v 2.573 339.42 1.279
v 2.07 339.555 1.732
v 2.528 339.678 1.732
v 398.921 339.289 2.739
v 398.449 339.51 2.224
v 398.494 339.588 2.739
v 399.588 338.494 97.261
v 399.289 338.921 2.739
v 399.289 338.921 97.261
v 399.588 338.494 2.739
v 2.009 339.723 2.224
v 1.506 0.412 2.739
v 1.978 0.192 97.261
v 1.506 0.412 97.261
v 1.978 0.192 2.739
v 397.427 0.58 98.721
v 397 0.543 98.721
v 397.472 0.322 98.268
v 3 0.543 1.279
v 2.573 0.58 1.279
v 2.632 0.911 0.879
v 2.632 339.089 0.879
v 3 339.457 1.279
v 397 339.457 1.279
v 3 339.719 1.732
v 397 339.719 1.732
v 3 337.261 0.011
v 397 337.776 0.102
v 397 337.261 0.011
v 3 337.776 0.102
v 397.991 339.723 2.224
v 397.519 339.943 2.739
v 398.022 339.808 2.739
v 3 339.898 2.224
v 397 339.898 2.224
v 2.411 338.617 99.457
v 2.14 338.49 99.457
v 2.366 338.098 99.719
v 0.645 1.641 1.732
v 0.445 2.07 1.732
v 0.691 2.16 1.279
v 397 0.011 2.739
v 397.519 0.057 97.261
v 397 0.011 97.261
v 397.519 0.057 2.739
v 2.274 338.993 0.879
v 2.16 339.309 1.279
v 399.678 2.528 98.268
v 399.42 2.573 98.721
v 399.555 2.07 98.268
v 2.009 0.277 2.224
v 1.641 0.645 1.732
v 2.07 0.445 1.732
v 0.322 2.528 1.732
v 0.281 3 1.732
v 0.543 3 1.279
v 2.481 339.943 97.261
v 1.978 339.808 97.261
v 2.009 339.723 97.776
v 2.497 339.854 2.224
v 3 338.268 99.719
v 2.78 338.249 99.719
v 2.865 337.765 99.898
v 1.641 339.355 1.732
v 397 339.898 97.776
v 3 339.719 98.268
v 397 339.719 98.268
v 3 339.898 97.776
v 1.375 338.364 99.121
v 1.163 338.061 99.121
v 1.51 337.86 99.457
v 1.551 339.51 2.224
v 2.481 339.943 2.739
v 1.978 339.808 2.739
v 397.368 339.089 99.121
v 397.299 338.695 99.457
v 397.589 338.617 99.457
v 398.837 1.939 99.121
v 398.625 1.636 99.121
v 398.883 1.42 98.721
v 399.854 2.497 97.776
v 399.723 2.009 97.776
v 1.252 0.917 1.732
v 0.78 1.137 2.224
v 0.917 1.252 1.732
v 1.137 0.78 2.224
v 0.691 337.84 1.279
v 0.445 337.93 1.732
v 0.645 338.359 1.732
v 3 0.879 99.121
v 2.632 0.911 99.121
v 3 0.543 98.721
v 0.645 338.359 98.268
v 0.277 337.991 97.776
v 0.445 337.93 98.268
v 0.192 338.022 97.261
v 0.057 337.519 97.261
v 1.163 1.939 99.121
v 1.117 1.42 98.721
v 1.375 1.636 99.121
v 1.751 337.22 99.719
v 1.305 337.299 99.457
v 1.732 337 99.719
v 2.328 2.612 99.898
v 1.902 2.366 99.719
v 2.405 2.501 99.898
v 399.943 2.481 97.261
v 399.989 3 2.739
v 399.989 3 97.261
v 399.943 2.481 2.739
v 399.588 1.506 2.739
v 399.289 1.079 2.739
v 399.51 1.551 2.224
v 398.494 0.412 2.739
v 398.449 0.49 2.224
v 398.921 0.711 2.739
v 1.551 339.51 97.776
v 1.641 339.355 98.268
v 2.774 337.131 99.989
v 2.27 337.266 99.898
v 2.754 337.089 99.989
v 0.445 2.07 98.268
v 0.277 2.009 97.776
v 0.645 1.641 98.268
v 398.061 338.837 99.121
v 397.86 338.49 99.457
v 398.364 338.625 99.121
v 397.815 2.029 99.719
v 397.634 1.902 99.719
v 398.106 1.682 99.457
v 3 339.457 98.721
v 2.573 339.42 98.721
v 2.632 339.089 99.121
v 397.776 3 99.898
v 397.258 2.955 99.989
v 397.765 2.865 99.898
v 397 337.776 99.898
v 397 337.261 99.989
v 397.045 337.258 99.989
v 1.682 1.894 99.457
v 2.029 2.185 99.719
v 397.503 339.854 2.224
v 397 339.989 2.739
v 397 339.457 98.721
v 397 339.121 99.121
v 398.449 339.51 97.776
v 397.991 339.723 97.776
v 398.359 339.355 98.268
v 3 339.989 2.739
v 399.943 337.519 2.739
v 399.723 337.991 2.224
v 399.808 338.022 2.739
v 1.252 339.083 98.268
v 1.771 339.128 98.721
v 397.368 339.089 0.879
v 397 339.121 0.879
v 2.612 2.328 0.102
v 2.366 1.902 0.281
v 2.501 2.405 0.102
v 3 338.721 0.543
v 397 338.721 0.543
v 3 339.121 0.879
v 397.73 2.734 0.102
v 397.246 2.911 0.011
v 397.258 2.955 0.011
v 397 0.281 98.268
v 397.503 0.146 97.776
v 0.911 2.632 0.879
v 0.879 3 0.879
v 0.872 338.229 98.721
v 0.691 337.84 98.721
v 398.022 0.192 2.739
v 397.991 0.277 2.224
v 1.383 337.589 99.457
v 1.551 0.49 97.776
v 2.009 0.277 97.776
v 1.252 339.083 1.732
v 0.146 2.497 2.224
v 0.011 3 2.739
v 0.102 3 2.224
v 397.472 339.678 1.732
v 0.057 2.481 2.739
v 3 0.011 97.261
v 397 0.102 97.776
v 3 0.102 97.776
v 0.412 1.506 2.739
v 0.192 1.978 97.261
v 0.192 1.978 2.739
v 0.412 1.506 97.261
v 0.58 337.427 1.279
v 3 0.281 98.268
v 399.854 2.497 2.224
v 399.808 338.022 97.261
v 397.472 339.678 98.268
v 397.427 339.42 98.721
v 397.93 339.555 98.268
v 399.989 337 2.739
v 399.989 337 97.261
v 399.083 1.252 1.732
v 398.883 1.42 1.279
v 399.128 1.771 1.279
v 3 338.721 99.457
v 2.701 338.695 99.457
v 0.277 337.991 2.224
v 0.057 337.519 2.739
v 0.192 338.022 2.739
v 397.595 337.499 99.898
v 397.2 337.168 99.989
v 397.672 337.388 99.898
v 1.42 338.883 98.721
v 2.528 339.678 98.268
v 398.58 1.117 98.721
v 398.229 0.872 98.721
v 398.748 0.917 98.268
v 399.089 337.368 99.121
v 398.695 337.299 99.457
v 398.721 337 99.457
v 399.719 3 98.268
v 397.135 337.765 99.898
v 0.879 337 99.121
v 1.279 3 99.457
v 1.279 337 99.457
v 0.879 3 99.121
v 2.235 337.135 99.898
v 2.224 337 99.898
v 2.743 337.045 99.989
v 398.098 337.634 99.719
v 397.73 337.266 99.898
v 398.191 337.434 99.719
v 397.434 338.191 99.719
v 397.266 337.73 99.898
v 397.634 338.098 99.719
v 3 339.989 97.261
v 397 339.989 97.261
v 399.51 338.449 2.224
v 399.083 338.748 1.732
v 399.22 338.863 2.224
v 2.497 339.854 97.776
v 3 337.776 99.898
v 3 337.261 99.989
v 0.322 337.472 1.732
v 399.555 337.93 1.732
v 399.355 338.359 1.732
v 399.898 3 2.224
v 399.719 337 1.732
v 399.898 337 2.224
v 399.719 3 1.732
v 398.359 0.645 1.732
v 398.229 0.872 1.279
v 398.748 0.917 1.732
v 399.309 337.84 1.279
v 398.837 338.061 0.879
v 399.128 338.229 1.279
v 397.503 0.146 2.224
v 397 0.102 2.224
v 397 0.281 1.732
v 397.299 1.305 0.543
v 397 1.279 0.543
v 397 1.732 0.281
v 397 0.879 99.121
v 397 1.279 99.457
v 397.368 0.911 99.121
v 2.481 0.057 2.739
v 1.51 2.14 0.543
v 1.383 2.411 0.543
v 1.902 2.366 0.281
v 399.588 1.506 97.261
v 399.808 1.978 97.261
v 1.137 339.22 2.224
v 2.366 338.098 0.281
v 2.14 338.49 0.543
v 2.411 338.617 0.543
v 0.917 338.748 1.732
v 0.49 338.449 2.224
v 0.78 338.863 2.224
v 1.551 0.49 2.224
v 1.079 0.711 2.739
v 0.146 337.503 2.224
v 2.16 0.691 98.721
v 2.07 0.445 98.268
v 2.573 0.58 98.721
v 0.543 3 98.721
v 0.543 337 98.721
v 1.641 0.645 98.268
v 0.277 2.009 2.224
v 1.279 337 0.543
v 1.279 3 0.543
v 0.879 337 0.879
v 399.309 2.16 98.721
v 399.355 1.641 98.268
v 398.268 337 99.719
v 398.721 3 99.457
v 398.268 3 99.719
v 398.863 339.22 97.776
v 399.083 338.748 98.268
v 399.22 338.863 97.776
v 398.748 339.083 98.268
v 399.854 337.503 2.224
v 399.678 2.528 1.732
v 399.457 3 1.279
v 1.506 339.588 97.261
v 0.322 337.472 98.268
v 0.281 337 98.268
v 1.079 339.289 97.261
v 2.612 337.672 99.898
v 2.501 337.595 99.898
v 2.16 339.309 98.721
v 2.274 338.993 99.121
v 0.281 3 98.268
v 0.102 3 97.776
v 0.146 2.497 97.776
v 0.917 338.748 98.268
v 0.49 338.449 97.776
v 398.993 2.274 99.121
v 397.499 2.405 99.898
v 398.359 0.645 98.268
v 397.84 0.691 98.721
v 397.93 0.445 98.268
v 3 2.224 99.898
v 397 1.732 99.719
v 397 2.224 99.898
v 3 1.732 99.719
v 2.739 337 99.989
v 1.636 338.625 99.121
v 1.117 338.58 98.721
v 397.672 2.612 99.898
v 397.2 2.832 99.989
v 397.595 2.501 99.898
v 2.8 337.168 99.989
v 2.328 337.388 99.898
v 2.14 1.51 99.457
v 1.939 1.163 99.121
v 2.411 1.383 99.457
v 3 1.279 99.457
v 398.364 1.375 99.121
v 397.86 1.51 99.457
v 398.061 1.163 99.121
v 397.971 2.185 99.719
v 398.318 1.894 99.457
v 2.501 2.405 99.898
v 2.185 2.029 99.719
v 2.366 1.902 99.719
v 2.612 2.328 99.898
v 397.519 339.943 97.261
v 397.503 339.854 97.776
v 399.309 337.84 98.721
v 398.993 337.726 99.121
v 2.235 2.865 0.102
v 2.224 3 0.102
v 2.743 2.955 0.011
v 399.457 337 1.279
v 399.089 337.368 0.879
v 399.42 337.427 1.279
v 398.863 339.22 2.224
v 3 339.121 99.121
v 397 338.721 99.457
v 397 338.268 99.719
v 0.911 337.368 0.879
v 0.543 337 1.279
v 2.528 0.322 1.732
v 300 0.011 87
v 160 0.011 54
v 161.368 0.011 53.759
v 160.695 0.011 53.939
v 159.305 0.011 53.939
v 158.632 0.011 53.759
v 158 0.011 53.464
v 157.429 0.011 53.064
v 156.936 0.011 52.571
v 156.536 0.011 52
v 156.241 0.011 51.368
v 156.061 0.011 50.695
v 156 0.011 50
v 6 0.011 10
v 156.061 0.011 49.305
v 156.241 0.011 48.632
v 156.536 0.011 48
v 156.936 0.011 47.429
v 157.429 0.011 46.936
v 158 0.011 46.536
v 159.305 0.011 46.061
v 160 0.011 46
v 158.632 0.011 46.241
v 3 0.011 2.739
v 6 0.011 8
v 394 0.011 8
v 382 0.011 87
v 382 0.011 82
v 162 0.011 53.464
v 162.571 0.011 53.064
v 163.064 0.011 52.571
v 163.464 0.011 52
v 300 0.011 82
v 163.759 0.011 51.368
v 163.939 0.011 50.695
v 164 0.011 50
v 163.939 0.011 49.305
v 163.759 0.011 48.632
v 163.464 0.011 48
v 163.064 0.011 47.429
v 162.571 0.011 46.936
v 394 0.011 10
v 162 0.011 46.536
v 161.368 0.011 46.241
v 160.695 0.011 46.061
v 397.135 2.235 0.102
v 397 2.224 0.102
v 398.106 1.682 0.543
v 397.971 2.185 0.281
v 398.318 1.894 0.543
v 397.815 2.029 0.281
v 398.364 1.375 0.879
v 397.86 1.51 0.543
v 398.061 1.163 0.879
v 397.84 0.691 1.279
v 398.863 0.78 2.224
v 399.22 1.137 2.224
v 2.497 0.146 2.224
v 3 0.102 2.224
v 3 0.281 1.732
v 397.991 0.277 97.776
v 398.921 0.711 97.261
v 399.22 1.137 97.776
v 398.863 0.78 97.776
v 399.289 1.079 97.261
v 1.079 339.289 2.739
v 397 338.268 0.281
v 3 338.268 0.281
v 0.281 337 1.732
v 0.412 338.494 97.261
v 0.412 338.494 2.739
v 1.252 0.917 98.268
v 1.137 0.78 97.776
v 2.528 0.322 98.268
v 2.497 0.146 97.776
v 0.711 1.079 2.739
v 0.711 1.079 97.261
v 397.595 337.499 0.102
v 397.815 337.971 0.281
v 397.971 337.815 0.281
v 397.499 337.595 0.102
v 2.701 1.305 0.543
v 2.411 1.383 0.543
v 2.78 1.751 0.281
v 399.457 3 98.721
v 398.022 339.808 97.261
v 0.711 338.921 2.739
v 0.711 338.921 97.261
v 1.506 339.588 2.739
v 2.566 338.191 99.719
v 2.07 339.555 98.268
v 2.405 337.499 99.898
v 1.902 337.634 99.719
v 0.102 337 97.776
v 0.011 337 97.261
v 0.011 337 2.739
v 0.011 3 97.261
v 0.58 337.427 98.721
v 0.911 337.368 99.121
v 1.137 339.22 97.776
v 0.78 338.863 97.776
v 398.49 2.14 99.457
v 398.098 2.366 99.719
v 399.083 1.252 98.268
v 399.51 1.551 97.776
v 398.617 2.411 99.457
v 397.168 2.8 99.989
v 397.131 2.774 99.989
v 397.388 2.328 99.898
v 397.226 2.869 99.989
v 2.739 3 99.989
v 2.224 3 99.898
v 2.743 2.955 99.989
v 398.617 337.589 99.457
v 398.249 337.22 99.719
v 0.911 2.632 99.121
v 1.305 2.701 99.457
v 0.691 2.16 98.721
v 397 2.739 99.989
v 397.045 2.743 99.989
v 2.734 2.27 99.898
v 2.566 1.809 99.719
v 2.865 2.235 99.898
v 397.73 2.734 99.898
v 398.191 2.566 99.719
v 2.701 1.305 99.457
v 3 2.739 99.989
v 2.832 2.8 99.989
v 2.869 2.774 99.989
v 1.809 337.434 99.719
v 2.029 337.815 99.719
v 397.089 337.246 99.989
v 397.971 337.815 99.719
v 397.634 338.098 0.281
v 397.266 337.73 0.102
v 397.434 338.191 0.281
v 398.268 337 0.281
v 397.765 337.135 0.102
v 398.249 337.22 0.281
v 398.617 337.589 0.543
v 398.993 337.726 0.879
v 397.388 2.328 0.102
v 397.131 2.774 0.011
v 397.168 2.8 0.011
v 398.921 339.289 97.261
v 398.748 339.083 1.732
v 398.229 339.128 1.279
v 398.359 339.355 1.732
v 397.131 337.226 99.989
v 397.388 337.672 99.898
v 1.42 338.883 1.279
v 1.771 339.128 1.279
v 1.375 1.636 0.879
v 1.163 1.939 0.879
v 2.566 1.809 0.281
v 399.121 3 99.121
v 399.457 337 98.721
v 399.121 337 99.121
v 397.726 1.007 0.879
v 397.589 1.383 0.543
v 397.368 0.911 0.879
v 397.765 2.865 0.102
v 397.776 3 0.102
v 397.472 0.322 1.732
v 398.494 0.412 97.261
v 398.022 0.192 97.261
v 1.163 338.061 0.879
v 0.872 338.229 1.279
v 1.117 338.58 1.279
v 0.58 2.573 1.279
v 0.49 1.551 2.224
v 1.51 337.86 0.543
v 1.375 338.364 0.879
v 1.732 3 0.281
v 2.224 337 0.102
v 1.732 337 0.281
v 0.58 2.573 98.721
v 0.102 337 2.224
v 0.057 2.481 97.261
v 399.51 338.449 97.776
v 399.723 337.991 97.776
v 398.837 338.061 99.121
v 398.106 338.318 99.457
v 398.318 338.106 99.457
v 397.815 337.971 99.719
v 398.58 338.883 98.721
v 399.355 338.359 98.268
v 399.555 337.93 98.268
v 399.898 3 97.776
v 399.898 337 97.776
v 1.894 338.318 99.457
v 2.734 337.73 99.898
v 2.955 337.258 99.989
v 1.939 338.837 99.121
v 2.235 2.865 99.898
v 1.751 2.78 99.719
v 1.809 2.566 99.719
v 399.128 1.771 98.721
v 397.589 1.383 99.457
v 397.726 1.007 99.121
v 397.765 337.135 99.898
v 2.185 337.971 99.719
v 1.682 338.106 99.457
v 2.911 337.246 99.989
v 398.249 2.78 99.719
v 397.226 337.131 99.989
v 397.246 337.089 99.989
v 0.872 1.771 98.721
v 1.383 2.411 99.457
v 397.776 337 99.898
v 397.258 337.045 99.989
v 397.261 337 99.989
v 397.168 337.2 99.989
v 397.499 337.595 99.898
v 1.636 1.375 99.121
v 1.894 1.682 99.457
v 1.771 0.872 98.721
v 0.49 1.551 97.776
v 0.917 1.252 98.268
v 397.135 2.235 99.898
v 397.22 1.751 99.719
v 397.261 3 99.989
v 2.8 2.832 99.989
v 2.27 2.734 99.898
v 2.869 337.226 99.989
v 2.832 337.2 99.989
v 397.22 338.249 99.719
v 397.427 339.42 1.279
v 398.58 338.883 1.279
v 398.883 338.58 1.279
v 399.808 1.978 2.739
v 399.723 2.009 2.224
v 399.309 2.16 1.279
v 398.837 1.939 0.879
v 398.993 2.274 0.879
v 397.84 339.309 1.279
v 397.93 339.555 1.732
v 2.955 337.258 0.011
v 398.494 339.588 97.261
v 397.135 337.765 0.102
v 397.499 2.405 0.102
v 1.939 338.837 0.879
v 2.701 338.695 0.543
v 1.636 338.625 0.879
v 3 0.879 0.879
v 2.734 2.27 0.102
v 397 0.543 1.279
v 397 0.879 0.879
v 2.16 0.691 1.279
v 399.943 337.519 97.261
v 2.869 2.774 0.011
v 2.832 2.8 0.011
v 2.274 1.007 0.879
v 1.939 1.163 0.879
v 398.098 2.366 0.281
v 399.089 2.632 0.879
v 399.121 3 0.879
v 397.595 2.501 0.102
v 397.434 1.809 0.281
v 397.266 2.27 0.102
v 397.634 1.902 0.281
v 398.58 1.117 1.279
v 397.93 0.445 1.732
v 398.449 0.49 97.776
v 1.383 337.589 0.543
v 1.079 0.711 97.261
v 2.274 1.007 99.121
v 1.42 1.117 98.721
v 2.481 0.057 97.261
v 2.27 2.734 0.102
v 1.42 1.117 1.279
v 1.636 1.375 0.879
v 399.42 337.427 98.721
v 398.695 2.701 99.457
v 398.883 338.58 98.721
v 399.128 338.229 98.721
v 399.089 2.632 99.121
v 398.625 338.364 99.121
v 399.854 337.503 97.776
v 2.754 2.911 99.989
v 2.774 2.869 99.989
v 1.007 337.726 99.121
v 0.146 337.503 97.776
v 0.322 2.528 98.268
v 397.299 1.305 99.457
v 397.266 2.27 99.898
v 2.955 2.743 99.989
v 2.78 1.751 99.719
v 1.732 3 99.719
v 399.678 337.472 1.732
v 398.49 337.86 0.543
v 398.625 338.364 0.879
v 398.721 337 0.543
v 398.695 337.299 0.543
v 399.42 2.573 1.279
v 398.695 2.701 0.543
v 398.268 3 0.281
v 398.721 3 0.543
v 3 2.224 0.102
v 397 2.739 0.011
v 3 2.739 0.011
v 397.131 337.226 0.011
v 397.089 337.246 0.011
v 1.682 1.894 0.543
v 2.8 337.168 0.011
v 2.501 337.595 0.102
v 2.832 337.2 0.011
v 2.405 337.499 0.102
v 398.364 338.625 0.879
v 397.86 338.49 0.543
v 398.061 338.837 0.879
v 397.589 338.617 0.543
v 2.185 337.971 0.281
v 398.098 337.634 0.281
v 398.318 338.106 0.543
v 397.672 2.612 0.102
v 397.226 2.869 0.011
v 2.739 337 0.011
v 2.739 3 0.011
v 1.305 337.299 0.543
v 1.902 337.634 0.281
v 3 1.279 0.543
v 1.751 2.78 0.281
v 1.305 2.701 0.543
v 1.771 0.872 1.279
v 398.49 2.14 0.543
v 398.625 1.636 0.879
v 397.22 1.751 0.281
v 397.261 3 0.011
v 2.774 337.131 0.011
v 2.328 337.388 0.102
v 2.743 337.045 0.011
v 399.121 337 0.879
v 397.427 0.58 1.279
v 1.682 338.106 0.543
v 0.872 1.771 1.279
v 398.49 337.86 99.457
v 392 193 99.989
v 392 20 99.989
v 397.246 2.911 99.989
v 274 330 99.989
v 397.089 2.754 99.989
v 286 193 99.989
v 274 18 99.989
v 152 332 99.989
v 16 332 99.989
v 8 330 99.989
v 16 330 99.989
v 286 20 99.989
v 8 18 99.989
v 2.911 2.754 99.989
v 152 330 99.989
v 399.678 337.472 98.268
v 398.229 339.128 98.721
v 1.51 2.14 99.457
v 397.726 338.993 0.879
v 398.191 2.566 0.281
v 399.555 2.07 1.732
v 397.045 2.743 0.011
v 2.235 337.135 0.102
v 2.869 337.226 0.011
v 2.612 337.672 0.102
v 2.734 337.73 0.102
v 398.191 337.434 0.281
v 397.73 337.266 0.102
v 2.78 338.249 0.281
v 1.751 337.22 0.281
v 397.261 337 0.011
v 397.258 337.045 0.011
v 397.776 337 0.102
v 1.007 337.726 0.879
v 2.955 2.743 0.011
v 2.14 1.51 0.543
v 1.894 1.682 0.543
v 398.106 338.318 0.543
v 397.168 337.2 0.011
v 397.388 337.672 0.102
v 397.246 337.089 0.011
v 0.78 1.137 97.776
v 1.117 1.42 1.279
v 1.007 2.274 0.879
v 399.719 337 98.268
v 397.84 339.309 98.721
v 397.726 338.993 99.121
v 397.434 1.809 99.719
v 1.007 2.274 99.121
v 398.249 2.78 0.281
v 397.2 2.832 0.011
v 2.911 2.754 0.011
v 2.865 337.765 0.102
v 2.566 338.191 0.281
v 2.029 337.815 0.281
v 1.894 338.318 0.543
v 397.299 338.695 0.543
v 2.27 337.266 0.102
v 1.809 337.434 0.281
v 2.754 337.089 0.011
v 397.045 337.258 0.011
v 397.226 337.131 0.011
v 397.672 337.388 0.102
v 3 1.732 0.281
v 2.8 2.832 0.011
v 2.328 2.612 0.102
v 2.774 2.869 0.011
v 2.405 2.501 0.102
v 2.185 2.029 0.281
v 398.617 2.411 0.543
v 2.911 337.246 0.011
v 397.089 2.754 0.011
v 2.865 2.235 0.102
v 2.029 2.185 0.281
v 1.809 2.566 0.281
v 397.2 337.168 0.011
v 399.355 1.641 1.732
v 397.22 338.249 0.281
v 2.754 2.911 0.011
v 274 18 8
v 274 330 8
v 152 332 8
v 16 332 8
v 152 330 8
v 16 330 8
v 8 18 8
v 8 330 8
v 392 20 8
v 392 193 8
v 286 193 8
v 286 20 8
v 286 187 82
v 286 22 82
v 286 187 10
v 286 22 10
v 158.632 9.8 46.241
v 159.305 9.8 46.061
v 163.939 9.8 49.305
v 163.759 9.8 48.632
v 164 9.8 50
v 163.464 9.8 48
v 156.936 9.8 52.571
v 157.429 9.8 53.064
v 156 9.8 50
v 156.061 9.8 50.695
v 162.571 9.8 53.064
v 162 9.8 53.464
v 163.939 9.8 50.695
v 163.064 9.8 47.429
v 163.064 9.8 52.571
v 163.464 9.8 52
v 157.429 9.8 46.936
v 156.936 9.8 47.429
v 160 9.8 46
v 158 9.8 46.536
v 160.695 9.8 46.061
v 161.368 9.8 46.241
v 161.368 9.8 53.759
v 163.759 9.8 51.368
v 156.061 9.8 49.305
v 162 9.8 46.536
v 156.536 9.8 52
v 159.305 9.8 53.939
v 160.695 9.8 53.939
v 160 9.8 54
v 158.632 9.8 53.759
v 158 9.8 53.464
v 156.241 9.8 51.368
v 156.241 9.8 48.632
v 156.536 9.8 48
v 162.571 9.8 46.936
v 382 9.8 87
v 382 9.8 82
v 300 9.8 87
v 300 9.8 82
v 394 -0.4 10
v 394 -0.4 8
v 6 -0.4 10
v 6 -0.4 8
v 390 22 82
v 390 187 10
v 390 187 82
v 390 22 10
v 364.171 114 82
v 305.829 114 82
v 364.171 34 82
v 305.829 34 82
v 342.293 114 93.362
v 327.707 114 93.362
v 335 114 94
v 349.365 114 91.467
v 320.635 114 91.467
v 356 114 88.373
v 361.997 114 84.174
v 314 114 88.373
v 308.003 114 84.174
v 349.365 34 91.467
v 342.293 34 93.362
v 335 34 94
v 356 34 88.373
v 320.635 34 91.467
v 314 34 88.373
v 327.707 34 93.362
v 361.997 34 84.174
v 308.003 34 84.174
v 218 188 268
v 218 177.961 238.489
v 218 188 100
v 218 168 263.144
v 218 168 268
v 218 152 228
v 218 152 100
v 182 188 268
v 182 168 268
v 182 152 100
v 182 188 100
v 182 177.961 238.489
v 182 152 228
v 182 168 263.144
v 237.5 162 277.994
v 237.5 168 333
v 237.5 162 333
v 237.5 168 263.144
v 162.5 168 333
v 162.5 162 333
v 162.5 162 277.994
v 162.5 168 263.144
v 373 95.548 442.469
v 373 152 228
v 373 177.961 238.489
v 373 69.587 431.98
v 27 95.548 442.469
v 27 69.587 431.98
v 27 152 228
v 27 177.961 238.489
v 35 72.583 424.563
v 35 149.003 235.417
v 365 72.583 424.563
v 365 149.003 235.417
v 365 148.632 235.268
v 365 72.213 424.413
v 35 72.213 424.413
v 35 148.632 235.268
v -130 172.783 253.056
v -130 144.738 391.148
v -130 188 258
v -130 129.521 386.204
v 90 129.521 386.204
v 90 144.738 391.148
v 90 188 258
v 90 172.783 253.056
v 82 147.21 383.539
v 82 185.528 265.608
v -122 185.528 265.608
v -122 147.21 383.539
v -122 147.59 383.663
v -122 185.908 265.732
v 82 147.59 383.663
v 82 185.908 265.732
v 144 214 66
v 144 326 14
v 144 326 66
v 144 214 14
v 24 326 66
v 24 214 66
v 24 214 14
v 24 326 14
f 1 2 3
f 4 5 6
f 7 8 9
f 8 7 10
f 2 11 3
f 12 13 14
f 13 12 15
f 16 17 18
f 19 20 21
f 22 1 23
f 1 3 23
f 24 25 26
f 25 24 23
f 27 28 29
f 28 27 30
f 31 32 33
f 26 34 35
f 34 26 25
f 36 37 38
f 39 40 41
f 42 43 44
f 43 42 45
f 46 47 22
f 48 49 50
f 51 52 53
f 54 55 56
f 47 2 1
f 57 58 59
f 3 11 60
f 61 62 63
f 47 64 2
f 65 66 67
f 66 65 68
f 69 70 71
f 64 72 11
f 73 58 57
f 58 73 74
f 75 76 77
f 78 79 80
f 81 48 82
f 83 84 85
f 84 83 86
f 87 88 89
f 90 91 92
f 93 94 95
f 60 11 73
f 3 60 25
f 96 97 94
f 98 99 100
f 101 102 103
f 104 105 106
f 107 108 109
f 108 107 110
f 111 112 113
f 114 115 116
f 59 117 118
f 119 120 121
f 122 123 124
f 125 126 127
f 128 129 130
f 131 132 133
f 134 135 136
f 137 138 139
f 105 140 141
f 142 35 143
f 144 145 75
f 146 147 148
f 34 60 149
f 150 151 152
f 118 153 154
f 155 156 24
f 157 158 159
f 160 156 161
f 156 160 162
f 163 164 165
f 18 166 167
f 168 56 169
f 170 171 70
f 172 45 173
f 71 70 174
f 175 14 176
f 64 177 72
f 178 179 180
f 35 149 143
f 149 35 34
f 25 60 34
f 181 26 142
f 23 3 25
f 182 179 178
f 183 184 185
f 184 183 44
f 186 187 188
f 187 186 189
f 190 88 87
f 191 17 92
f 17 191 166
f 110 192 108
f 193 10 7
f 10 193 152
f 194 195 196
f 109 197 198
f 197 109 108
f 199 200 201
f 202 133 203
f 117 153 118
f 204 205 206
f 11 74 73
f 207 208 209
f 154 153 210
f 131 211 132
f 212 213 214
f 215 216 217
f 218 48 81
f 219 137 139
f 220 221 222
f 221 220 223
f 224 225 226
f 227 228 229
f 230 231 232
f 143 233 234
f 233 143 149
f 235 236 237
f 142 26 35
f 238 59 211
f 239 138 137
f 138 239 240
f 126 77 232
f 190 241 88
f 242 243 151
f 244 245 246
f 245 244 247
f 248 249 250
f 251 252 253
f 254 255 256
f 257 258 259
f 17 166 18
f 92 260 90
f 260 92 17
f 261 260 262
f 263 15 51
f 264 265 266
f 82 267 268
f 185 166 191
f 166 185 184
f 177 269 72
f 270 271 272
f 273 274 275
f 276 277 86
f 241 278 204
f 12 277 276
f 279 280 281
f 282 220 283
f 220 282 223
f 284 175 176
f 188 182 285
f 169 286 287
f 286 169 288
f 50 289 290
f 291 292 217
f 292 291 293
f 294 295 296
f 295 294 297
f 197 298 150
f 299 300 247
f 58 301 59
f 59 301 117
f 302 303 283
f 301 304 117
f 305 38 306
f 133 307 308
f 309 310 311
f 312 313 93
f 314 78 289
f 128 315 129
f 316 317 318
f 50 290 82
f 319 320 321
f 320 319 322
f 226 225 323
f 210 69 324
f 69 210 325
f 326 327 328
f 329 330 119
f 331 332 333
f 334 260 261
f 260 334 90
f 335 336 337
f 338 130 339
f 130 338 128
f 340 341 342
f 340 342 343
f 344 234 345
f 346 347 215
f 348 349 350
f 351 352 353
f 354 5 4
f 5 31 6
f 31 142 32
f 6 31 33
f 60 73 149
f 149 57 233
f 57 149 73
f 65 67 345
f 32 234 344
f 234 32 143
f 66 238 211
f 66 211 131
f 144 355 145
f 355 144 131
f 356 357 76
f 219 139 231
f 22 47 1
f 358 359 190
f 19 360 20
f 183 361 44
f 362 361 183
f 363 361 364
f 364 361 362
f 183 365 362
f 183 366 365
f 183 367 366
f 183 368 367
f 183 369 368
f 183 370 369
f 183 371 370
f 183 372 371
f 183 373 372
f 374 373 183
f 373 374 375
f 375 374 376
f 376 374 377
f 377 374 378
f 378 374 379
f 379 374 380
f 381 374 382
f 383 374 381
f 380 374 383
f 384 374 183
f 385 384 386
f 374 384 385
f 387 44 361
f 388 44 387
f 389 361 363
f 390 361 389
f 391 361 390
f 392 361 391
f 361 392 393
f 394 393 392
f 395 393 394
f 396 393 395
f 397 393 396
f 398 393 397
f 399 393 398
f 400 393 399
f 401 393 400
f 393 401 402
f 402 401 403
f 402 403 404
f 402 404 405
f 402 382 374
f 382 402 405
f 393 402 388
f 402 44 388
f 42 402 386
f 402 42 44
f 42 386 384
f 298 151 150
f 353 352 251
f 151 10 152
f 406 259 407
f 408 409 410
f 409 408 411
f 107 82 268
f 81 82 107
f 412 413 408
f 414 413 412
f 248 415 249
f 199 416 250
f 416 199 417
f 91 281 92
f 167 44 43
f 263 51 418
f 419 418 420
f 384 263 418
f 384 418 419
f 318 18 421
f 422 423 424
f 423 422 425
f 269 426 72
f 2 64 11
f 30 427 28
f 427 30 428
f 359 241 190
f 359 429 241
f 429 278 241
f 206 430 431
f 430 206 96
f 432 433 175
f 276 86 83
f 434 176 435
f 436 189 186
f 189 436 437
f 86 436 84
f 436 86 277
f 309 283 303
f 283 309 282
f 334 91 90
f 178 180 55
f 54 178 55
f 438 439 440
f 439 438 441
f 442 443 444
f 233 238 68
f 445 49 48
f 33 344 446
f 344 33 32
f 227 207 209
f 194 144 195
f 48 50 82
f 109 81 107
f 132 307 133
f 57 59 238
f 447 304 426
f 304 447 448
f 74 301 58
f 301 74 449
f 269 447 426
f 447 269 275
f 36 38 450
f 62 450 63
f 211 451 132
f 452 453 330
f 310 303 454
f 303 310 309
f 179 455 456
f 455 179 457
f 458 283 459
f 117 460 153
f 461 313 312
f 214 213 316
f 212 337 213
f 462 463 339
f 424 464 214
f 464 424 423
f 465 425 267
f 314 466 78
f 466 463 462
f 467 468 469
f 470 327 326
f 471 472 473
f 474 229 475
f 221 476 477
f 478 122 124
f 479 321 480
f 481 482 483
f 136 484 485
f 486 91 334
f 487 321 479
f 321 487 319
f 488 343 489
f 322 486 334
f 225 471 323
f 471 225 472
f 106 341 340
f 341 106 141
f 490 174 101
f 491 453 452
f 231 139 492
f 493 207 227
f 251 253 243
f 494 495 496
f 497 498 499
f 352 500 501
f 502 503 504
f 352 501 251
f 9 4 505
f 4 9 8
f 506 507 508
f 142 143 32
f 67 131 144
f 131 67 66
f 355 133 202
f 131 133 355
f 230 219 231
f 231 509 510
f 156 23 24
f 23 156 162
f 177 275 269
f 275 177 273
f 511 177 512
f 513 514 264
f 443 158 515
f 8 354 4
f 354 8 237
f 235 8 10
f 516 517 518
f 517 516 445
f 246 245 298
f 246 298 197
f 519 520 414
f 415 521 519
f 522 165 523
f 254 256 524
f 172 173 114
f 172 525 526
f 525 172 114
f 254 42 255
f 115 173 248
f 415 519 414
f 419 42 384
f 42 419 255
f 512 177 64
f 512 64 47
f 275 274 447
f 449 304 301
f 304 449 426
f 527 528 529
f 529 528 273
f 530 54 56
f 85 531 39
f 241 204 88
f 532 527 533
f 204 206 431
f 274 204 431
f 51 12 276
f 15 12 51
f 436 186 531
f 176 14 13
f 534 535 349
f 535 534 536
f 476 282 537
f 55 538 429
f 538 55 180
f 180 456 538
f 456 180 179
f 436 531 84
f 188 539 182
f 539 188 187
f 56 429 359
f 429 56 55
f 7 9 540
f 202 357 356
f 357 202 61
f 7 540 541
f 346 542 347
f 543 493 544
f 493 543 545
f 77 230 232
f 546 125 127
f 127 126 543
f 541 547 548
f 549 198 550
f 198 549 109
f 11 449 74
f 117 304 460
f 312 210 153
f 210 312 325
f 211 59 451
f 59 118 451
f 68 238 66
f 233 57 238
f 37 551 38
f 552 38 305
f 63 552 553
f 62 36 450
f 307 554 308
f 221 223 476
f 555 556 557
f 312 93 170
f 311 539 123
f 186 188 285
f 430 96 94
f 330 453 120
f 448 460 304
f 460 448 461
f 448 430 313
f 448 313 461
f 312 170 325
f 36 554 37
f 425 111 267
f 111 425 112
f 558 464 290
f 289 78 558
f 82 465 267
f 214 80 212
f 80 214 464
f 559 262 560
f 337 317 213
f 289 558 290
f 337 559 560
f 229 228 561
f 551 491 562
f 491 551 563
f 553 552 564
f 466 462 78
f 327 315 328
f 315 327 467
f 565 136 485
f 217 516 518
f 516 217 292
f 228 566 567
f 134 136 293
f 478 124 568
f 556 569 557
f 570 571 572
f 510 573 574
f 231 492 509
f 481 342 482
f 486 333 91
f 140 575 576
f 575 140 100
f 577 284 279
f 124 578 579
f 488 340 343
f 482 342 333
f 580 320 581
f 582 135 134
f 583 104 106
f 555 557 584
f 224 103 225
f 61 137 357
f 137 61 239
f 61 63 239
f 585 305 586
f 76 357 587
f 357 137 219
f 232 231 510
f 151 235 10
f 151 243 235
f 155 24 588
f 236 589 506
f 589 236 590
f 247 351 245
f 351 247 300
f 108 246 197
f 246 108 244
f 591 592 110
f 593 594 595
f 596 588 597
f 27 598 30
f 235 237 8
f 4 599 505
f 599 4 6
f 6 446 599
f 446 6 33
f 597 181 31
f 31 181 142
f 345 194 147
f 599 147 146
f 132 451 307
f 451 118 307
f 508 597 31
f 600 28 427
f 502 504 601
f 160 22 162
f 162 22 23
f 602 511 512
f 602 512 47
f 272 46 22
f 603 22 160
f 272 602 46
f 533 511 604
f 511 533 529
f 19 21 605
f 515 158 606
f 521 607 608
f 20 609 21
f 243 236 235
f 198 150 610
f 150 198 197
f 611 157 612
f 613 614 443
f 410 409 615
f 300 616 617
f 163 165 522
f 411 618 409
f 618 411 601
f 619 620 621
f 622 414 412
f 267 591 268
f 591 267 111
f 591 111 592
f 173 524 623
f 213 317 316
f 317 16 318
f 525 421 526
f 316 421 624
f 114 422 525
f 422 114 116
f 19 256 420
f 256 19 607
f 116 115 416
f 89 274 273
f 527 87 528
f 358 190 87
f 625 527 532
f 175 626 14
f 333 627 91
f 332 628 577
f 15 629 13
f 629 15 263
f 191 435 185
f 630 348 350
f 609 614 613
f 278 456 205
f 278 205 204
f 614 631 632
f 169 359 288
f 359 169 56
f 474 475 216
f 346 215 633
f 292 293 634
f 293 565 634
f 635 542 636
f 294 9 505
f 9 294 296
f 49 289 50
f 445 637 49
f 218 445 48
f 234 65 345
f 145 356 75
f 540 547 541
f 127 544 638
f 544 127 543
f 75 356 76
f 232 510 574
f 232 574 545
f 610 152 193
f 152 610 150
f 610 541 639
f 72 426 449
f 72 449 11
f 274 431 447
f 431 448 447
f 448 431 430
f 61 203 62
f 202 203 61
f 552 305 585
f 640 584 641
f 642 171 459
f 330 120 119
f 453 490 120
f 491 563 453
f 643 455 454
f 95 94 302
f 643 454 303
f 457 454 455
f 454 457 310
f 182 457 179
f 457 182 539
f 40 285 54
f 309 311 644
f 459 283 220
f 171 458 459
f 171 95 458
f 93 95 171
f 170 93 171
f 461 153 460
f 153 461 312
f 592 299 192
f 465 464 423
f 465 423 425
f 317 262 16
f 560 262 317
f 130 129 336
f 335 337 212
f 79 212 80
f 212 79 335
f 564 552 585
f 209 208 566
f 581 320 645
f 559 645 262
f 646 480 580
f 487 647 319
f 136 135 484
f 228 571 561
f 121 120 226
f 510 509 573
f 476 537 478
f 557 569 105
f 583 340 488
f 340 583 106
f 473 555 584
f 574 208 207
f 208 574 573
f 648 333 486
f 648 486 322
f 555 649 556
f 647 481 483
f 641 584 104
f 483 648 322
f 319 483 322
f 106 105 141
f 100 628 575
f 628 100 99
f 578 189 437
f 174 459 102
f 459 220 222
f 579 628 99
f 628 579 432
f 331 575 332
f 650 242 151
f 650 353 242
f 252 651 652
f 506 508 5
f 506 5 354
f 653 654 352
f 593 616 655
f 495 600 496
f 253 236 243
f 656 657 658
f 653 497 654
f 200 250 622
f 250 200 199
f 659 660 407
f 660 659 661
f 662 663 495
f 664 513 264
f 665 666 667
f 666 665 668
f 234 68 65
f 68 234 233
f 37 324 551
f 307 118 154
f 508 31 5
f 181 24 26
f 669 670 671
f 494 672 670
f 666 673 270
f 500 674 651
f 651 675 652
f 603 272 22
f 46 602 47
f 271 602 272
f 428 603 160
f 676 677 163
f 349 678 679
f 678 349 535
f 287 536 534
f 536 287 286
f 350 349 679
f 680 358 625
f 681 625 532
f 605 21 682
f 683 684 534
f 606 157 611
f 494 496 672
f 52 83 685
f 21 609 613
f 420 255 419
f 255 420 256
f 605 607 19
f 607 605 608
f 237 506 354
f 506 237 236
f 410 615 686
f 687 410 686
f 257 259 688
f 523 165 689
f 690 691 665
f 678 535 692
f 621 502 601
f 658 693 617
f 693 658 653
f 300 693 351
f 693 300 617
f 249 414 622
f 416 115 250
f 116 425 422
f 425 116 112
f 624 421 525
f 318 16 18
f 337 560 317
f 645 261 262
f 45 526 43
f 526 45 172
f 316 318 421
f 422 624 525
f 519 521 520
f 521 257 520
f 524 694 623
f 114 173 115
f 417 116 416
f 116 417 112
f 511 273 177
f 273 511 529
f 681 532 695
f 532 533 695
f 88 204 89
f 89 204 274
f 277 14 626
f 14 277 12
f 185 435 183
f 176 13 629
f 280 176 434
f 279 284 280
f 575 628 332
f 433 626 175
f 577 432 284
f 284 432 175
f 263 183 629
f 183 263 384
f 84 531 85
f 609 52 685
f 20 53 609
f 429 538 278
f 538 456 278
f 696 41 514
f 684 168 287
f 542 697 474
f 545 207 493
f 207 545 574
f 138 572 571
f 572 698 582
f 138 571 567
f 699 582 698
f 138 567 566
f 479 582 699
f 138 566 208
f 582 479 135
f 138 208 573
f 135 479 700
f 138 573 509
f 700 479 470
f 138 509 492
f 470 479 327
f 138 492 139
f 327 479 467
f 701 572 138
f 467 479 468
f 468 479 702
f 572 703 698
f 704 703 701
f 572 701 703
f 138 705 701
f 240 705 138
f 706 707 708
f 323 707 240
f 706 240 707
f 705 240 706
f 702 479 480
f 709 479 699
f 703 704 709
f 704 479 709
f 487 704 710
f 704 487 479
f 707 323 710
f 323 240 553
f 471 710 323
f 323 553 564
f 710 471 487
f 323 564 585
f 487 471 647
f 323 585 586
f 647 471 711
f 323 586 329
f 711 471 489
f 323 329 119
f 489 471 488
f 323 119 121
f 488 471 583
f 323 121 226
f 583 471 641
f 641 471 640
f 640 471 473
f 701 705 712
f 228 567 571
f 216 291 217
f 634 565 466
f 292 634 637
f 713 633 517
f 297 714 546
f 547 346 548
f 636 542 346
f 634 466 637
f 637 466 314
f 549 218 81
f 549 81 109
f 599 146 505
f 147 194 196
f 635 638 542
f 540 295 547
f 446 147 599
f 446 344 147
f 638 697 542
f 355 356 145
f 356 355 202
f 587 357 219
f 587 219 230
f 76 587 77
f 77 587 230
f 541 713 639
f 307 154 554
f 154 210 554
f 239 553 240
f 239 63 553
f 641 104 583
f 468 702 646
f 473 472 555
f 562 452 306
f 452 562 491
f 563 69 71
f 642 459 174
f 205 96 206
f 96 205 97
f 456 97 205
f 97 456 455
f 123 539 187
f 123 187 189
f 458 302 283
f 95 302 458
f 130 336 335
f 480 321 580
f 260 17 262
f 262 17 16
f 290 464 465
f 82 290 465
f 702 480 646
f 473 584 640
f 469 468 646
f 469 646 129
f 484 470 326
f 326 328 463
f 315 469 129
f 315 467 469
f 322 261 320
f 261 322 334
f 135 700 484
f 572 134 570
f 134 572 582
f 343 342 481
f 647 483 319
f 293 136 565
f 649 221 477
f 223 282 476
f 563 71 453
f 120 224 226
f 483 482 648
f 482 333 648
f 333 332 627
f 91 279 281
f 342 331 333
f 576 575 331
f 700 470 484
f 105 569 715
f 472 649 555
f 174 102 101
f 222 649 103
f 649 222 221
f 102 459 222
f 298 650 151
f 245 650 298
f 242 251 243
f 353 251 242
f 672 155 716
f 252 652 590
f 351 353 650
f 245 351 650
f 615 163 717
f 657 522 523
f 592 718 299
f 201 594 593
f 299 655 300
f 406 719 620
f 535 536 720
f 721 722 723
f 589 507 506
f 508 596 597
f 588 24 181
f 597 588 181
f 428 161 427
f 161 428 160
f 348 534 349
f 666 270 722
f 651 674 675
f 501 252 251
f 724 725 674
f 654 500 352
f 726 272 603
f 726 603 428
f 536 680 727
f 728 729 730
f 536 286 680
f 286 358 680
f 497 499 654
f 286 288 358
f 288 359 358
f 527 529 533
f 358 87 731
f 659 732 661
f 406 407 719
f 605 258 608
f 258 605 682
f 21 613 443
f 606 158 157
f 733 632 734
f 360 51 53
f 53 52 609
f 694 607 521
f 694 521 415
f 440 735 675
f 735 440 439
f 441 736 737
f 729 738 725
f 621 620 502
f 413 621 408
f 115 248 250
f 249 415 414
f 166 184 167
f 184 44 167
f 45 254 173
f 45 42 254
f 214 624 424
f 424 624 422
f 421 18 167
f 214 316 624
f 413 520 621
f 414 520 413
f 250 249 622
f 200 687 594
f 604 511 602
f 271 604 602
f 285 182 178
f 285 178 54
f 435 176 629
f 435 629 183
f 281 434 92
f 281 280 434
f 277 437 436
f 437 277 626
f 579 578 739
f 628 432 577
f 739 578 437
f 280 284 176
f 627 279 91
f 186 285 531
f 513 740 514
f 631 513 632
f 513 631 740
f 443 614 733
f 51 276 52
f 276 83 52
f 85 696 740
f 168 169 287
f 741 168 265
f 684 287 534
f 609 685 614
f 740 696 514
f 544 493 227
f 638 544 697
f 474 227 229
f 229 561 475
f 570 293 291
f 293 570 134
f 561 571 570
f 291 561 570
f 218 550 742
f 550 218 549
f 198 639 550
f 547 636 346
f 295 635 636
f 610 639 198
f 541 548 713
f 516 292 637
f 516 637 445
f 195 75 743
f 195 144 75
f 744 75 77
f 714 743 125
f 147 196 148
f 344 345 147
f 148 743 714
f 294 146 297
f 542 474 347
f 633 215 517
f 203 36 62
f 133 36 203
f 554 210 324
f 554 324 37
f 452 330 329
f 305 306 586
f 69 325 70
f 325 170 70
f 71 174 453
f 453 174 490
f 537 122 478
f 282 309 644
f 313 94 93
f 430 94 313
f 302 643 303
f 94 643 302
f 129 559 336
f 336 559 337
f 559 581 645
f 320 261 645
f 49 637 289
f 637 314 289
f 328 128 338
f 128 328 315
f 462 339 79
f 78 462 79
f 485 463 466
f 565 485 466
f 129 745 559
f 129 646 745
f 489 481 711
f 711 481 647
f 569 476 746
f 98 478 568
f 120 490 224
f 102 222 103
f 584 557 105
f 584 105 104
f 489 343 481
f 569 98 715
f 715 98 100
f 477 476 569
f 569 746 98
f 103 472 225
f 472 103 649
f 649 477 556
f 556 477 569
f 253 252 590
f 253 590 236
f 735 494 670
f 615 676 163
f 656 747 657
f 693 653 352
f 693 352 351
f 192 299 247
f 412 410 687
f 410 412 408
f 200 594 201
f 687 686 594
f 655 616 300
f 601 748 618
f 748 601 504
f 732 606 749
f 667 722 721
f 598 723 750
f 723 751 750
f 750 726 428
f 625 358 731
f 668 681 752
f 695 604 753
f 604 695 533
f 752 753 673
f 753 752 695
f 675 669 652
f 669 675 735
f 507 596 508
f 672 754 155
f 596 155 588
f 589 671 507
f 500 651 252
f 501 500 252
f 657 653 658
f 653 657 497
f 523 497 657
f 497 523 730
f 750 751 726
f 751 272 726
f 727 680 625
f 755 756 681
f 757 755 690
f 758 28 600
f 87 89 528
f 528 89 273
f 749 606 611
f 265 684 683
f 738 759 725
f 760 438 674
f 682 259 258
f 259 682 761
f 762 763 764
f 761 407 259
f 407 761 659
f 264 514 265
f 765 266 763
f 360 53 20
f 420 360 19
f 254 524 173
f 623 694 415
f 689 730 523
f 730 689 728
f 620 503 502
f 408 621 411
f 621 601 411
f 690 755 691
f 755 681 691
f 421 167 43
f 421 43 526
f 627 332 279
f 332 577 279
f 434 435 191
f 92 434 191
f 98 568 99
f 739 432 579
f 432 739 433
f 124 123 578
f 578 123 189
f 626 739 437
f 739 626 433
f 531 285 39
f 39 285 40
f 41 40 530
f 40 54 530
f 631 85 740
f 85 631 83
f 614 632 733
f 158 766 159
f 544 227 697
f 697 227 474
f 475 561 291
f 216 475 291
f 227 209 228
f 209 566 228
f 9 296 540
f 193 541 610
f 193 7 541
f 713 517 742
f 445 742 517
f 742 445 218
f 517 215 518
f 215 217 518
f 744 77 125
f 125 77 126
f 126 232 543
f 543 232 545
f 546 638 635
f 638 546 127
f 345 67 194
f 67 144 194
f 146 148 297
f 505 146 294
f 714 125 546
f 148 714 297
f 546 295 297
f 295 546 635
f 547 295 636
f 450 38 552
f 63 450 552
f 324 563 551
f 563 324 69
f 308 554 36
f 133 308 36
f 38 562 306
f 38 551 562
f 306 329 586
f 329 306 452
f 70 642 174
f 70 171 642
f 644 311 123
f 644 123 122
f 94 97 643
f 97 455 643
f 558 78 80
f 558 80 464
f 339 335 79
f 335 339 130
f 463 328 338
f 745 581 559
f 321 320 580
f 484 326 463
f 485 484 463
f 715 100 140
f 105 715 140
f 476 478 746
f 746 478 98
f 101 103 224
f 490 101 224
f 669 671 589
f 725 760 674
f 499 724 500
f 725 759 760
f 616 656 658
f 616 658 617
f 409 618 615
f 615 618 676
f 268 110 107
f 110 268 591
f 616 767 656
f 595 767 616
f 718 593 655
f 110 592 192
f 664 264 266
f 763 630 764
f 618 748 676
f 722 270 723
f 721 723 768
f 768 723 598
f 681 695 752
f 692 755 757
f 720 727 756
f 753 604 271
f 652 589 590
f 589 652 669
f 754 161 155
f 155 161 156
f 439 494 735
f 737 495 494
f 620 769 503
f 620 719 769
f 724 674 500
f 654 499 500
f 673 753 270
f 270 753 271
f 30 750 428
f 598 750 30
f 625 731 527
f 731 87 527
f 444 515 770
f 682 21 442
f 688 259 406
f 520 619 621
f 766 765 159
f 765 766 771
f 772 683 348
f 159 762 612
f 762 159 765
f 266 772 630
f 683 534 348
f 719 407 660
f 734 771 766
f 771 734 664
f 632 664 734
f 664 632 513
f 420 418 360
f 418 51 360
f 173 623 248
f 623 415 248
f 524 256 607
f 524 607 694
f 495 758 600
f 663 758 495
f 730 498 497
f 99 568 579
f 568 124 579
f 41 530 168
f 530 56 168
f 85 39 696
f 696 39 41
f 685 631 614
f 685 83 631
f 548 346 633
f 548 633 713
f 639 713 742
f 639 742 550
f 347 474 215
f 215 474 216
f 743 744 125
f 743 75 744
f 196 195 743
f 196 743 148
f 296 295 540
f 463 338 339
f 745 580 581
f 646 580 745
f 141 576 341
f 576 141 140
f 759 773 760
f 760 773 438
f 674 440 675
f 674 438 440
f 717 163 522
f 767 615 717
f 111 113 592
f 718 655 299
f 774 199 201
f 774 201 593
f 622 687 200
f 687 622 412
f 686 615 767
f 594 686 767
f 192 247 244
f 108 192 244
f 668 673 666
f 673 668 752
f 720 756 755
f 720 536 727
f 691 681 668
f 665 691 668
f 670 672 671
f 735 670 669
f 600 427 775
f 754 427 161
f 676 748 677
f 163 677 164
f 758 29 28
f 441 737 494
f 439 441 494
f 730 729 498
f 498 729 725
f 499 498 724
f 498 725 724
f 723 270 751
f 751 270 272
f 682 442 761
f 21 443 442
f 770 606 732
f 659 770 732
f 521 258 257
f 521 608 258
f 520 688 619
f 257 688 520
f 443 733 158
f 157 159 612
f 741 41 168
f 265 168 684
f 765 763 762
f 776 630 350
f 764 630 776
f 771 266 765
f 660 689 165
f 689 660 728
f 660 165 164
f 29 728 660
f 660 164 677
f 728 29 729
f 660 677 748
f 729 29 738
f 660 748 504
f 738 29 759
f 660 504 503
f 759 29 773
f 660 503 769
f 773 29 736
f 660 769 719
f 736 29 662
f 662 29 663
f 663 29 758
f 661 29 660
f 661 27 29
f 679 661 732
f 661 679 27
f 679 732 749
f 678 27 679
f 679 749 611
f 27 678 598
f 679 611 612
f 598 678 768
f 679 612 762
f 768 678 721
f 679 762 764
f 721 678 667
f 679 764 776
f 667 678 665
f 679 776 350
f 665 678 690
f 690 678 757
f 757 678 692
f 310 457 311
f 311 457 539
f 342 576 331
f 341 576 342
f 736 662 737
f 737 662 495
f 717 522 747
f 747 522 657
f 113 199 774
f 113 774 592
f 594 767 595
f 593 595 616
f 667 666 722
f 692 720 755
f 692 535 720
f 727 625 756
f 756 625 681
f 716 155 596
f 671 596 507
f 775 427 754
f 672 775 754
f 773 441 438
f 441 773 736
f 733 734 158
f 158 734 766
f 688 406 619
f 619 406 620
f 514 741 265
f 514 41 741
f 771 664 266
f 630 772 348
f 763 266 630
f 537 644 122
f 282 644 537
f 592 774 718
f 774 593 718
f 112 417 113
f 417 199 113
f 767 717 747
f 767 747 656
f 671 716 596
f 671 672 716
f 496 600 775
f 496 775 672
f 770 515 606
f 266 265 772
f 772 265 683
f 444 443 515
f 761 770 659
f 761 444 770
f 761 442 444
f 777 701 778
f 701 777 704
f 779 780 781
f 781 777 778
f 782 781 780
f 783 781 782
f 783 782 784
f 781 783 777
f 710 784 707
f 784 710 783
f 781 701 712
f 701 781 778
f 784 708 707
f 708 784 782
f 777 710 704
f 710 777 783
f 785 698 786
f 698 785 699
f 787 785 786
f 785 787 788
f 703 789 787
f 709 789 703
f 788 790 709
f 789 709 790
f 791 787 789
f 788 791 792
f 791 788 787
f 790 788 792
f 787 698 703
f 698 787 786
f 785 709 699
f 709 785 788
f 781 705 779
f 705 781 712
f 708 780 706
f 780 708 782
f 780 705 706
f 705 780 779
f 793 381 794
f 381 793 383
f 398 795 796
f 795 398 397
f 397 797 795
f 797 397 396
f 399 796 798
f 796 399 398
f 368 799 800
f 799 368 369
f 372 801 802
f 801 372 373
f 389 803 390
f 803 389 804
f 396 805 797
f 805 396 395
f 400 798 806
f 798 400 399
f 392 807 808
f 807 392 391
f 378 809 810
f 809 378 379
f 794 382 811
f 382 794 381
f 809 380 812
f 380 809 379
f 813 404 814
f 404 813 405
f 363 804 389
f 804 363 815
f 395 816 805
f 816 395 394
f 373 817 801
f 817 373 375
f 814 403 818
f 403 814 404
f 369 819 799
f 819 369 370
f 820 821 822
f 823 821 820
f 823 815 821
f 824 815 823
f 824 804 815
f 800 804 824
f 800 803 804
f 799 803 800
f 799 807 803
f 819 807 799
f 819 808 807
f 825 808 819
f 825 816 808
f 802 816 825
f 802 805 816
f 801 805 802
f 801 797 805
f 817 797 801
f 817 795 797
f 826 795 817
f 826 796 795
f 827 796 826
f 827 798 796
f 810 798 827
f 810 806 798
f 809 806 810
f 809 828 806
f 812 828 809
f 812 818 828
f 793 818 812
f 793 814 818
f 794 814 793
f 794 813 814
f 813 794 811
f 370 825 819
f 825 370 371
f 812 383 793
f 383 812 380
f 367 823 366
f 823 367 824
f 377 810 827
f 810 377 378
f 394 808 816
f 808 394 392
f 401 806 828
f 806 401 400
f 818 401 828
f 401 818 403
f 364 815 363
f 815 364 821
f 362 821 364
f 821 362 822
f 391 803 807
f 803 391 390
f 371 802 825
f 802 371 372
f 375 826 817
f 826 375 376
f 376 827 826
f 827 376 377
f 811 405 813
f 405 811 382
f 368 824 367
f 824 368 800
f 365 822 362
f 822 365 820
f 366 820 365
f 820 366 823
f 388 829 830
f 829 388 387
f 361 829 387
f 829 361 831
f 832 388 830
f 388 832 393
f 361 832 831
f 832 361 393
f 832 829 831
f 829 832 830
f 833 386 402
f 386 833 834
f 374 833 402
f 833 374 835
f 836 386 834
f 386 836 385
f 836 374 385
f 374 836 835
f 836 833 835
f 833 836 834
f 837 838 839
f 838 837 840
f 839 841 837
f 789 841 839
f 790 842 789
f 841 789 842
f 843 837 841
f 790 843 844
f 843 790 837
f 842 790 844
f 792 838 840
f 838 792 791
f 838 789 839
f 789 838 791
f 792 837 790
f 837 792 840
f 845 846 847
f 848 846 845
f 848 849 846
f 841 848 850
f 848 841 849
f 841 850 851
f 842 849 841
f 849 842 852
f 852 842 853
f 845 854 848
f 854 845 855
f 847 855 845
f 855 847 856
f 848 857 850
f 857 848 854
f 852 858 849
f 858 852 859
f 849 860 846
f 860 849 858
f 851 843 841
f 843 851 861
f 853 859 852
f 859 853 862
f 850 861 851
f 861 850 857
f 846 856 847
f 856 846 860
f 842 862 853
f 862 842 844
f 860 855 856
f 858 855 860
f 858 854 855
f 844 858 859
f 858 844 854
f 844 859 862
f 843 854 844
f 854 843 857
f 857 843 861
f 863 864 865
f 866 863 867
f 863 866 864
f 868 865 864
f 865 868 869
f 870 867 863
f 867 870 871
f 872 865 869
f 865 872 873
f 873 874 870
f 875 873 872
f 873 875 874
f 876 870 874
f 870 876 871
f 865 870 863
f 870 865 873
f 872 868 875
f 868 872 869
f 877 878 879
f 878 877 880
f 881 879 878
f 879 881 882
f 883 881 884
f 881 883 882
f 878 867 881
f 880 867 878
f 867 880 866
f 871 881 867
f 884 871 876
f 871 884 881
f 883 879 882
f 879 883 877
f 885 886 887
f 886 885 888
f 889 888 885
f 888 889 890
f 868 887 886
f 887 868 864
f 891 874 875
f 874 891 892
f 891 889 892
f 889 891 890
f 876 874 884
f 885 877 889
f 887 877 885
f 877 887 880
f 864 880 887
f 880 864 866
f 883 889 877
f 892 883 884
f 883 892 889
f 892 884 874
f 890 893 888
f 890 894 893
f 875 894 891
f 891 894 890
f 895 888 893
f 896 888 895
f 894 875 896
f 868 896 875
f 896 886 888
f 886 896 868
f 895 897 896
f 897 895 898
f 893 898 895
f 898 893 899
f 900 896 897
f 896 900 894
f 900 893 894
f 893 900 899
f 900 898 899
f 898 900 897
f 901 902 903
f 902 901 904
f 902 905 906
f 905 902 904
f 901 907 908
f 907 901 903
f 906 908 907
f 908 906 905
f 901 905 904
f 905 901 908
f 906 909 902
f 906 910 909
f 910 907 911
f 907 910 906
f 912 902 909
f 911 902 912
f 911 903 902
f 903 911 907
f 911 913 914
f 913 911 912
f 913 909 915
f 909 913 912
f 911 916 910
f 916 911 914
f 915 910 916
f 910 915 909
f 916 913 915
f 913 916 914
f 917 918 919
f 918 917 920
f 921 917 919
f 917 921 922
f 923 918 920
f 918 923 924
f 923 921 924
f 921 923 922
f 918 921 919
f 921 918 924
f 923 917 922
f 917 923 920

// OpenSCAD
// Vysion kassa — concept CAD (mm)
// Groot scherm + lade + printer = kassierskant
// Klein scherm = klant, rug-aan-rug
// Printbed max 250×250×250 — kappen in helften
//
// Open in OpenSCAD. Modes:
//   view = "assembled" | "exploded" | "print"

view = "assembled"; // "assembled" | "exploded" | "print"
$fn = 36;

// --- gekocht ---
drawer_w = 400;
drawer_d = 340;
drawer_h = 100;
// Star alleen binnenwerk (geen plastic kast) — schatting tot je hem opmeet
printer_w = 110;
printer_d = 165;
printer_h = 72;
paper_roll = 84;

// Mini-PC (NUC-formaat) achterin het ladeblok, niet in het geldvak
pc_w = 120;
pc_d = 112;
pc_h = 52;

elo_w = 346;
elo_h = 220;
elo_t = 28;

cfd_w = 220;
cfd_h = 140;
cfd_t = 16;

vesa = 75;
neck_w = 36;
neck_d = 36;
neck_h = 168;

explode = view == "exploded" ? 55 : 0;

module rounded_box(size, r = 2) {
  w = size[0]; d = size[1]; h = size[2];
  hull() {
    for (x = [r, w - r], y = [r, d - r], z = [r, h - r])
      translate([x, y, z]) sphere(r);
  }
}

module cash_drawer() {
  bay = printer_w + 8;
  difference() {
    rounded_box([drawer_w, drawer_d, drawer_h], 3);
    // geldvak (links)
    translate([8, 18, 8])
      cube([drawer_w - bay - 16, drawer_d - 28, drawer_h]);
    // printerholte (rechts-voor)
    translate([drawer_w - bay + 4, 20, 8])
      cube([bay - 12, printer_d + 8, drawer_h]);
    // servicevak mini-PC (achterin, klep aan de klantkant)
    translate([16, drawer_d - pc_d - 20, 8])
      cube([pc_w + 16, pc_d + 12, drawer_h]);
    // slot
    translate([drawer_w / 2 - 40, -0.2, drawer_h / 2])
      rotate([-90, 0, 0]) cylinder(h = 10, r = 4);
    // bon-gleuf
    translate([drawer_w - bay + 18, -0.2, drawer_h - 18])
      cube([bay - 36, 10, 5]);
  }
  // oranje lijntje (concept)
  color("#FF6B35")
    translate([6, -0.4, 8])
      cube([drawer_w - 12, 1.2, 2]);
}

module star_printer() {
  ox = drawer_w - printer_w - 10;
  color("#2a2a2e")
    translate([ox, 22, 10])
      cube([printer_w, printer_d, printer_h]);
  color("#f3f1ea")
    translate([ox + printer_w / 2, 22 + 52, 10 + paper_roll / 2])
      rotate([90, 0, 0])
        cylinder(h = 80, r = paper_roll / 2, center = true);
}

module mini_pc() {
  color("#6a6e74")
    translate([
      24,
      drawer_d - pc_d - 14 + (view == "exploded" ? explode : 0),
      14
    ])
      cube([pc_w, pc_d, pc_h]);
}

module alu_neck() {
  color("#b8bcc4")
    translate([drawer_w / 2 - neck_w / 2, drawer_d / 2 - neck_d / 2, drawer_h])
      cube([neck_w, neck_d, neck_h]);
  // VESA-plaat kassier
  color("#9aa0a8")
    translate([drawer_w / 2 - vesa / 2, drawer_d / 2 - 8, drawer_h + neck_h - 10])
      cube([vesa, 6, vesa]);
}

module screen(w, h, t) {
  color("#111114") cube([w, t, h]);
  color("#1c1c22")
    translate([8, -0.4, 8])
      cube([w - 16, 0.6, h - 16]);
}

module cashier_screen() {
  translate([
    drawer_w / 2 - elo_w / 2,
    drawer_d / 2 - 18 - explode,
    drawer_h + neck_h - 40
  ])
    rotate([22, 0, 0])
      screen(elo_w, elo_h, elo_t);
}

module customer_screen() {
  translate([
    drawer_w / 2 - cfd_w / 2,
    drawer_d / 2 + 18 + explode,
    drawer_h + neck_h - 10
  ])
    rotate([-18, 0, 180])
      screen(cfd_w, cfd_h, cfd_t);
}

module shroud_half(w, h, t, side = -1) {
  // printkap: dunne schaal, 2 helften
  wall = 3;
  difference() {
    translate([side == -1 ? -wall : w / 2, -wall, -wall])
      cube([w / 2 + wall, t + wall * 2, h + wall * 2]);
    translate([-0.5, 0, 0]) cube([w + 1, t, h]);
  }
}

module print_parts() {
  // elk stuk ≤ 250 mm
  translate([0, 0, 0])
    difference() {
      cube([drawer_w / 2 - 2, 12, drawer_h]);
      translate([drawer_w / 4 - 6, -1, drawer_h / 2 - 6])
        cube([12, 14, 12]);
    }
  translate([drawer_w / 2 + 4, 0, 0])
    cube([drawer_w / 2 - 4, 12, drawer_h]);

  translate([0, 40, 0])
    shroud_half(elo_w, elo_h, elo_t, -1);
  translate([elo_w / 2 + 20, 40, 0])
    shroud_half(elo_w, elo_h, elo_t, 1);

  translate([0, 120, 0])
    shroud_half(cfd_w, cfd_h, cfd_t, -1);
  translate([cfd_w / 2 + 16, 120, 0])
    shroud_half(cfd_w, cfd_h, cfd_t, 1);

  translate([0, 200, 0])
    cube([neck_w / 2 + 4, neck_d + 8, neck_h]);
  translate([neck_w + 20, 200, 0])
    cube([neck_w / 2 + 4, neck_d + 8, neck_h]);

  translate([200, 200, 0])
    cube([printer_w + 8, 8, 70]); // printerklep
}

if (view == "print") {
  print_parts();
} else {
  color("#2c2c30") cash_drawer();
  star_printer();
  mini_pc();
  translate([0, 0, explode * 0.4]) alu_neck();
  cashier_screen();
  customer_screen();
}
